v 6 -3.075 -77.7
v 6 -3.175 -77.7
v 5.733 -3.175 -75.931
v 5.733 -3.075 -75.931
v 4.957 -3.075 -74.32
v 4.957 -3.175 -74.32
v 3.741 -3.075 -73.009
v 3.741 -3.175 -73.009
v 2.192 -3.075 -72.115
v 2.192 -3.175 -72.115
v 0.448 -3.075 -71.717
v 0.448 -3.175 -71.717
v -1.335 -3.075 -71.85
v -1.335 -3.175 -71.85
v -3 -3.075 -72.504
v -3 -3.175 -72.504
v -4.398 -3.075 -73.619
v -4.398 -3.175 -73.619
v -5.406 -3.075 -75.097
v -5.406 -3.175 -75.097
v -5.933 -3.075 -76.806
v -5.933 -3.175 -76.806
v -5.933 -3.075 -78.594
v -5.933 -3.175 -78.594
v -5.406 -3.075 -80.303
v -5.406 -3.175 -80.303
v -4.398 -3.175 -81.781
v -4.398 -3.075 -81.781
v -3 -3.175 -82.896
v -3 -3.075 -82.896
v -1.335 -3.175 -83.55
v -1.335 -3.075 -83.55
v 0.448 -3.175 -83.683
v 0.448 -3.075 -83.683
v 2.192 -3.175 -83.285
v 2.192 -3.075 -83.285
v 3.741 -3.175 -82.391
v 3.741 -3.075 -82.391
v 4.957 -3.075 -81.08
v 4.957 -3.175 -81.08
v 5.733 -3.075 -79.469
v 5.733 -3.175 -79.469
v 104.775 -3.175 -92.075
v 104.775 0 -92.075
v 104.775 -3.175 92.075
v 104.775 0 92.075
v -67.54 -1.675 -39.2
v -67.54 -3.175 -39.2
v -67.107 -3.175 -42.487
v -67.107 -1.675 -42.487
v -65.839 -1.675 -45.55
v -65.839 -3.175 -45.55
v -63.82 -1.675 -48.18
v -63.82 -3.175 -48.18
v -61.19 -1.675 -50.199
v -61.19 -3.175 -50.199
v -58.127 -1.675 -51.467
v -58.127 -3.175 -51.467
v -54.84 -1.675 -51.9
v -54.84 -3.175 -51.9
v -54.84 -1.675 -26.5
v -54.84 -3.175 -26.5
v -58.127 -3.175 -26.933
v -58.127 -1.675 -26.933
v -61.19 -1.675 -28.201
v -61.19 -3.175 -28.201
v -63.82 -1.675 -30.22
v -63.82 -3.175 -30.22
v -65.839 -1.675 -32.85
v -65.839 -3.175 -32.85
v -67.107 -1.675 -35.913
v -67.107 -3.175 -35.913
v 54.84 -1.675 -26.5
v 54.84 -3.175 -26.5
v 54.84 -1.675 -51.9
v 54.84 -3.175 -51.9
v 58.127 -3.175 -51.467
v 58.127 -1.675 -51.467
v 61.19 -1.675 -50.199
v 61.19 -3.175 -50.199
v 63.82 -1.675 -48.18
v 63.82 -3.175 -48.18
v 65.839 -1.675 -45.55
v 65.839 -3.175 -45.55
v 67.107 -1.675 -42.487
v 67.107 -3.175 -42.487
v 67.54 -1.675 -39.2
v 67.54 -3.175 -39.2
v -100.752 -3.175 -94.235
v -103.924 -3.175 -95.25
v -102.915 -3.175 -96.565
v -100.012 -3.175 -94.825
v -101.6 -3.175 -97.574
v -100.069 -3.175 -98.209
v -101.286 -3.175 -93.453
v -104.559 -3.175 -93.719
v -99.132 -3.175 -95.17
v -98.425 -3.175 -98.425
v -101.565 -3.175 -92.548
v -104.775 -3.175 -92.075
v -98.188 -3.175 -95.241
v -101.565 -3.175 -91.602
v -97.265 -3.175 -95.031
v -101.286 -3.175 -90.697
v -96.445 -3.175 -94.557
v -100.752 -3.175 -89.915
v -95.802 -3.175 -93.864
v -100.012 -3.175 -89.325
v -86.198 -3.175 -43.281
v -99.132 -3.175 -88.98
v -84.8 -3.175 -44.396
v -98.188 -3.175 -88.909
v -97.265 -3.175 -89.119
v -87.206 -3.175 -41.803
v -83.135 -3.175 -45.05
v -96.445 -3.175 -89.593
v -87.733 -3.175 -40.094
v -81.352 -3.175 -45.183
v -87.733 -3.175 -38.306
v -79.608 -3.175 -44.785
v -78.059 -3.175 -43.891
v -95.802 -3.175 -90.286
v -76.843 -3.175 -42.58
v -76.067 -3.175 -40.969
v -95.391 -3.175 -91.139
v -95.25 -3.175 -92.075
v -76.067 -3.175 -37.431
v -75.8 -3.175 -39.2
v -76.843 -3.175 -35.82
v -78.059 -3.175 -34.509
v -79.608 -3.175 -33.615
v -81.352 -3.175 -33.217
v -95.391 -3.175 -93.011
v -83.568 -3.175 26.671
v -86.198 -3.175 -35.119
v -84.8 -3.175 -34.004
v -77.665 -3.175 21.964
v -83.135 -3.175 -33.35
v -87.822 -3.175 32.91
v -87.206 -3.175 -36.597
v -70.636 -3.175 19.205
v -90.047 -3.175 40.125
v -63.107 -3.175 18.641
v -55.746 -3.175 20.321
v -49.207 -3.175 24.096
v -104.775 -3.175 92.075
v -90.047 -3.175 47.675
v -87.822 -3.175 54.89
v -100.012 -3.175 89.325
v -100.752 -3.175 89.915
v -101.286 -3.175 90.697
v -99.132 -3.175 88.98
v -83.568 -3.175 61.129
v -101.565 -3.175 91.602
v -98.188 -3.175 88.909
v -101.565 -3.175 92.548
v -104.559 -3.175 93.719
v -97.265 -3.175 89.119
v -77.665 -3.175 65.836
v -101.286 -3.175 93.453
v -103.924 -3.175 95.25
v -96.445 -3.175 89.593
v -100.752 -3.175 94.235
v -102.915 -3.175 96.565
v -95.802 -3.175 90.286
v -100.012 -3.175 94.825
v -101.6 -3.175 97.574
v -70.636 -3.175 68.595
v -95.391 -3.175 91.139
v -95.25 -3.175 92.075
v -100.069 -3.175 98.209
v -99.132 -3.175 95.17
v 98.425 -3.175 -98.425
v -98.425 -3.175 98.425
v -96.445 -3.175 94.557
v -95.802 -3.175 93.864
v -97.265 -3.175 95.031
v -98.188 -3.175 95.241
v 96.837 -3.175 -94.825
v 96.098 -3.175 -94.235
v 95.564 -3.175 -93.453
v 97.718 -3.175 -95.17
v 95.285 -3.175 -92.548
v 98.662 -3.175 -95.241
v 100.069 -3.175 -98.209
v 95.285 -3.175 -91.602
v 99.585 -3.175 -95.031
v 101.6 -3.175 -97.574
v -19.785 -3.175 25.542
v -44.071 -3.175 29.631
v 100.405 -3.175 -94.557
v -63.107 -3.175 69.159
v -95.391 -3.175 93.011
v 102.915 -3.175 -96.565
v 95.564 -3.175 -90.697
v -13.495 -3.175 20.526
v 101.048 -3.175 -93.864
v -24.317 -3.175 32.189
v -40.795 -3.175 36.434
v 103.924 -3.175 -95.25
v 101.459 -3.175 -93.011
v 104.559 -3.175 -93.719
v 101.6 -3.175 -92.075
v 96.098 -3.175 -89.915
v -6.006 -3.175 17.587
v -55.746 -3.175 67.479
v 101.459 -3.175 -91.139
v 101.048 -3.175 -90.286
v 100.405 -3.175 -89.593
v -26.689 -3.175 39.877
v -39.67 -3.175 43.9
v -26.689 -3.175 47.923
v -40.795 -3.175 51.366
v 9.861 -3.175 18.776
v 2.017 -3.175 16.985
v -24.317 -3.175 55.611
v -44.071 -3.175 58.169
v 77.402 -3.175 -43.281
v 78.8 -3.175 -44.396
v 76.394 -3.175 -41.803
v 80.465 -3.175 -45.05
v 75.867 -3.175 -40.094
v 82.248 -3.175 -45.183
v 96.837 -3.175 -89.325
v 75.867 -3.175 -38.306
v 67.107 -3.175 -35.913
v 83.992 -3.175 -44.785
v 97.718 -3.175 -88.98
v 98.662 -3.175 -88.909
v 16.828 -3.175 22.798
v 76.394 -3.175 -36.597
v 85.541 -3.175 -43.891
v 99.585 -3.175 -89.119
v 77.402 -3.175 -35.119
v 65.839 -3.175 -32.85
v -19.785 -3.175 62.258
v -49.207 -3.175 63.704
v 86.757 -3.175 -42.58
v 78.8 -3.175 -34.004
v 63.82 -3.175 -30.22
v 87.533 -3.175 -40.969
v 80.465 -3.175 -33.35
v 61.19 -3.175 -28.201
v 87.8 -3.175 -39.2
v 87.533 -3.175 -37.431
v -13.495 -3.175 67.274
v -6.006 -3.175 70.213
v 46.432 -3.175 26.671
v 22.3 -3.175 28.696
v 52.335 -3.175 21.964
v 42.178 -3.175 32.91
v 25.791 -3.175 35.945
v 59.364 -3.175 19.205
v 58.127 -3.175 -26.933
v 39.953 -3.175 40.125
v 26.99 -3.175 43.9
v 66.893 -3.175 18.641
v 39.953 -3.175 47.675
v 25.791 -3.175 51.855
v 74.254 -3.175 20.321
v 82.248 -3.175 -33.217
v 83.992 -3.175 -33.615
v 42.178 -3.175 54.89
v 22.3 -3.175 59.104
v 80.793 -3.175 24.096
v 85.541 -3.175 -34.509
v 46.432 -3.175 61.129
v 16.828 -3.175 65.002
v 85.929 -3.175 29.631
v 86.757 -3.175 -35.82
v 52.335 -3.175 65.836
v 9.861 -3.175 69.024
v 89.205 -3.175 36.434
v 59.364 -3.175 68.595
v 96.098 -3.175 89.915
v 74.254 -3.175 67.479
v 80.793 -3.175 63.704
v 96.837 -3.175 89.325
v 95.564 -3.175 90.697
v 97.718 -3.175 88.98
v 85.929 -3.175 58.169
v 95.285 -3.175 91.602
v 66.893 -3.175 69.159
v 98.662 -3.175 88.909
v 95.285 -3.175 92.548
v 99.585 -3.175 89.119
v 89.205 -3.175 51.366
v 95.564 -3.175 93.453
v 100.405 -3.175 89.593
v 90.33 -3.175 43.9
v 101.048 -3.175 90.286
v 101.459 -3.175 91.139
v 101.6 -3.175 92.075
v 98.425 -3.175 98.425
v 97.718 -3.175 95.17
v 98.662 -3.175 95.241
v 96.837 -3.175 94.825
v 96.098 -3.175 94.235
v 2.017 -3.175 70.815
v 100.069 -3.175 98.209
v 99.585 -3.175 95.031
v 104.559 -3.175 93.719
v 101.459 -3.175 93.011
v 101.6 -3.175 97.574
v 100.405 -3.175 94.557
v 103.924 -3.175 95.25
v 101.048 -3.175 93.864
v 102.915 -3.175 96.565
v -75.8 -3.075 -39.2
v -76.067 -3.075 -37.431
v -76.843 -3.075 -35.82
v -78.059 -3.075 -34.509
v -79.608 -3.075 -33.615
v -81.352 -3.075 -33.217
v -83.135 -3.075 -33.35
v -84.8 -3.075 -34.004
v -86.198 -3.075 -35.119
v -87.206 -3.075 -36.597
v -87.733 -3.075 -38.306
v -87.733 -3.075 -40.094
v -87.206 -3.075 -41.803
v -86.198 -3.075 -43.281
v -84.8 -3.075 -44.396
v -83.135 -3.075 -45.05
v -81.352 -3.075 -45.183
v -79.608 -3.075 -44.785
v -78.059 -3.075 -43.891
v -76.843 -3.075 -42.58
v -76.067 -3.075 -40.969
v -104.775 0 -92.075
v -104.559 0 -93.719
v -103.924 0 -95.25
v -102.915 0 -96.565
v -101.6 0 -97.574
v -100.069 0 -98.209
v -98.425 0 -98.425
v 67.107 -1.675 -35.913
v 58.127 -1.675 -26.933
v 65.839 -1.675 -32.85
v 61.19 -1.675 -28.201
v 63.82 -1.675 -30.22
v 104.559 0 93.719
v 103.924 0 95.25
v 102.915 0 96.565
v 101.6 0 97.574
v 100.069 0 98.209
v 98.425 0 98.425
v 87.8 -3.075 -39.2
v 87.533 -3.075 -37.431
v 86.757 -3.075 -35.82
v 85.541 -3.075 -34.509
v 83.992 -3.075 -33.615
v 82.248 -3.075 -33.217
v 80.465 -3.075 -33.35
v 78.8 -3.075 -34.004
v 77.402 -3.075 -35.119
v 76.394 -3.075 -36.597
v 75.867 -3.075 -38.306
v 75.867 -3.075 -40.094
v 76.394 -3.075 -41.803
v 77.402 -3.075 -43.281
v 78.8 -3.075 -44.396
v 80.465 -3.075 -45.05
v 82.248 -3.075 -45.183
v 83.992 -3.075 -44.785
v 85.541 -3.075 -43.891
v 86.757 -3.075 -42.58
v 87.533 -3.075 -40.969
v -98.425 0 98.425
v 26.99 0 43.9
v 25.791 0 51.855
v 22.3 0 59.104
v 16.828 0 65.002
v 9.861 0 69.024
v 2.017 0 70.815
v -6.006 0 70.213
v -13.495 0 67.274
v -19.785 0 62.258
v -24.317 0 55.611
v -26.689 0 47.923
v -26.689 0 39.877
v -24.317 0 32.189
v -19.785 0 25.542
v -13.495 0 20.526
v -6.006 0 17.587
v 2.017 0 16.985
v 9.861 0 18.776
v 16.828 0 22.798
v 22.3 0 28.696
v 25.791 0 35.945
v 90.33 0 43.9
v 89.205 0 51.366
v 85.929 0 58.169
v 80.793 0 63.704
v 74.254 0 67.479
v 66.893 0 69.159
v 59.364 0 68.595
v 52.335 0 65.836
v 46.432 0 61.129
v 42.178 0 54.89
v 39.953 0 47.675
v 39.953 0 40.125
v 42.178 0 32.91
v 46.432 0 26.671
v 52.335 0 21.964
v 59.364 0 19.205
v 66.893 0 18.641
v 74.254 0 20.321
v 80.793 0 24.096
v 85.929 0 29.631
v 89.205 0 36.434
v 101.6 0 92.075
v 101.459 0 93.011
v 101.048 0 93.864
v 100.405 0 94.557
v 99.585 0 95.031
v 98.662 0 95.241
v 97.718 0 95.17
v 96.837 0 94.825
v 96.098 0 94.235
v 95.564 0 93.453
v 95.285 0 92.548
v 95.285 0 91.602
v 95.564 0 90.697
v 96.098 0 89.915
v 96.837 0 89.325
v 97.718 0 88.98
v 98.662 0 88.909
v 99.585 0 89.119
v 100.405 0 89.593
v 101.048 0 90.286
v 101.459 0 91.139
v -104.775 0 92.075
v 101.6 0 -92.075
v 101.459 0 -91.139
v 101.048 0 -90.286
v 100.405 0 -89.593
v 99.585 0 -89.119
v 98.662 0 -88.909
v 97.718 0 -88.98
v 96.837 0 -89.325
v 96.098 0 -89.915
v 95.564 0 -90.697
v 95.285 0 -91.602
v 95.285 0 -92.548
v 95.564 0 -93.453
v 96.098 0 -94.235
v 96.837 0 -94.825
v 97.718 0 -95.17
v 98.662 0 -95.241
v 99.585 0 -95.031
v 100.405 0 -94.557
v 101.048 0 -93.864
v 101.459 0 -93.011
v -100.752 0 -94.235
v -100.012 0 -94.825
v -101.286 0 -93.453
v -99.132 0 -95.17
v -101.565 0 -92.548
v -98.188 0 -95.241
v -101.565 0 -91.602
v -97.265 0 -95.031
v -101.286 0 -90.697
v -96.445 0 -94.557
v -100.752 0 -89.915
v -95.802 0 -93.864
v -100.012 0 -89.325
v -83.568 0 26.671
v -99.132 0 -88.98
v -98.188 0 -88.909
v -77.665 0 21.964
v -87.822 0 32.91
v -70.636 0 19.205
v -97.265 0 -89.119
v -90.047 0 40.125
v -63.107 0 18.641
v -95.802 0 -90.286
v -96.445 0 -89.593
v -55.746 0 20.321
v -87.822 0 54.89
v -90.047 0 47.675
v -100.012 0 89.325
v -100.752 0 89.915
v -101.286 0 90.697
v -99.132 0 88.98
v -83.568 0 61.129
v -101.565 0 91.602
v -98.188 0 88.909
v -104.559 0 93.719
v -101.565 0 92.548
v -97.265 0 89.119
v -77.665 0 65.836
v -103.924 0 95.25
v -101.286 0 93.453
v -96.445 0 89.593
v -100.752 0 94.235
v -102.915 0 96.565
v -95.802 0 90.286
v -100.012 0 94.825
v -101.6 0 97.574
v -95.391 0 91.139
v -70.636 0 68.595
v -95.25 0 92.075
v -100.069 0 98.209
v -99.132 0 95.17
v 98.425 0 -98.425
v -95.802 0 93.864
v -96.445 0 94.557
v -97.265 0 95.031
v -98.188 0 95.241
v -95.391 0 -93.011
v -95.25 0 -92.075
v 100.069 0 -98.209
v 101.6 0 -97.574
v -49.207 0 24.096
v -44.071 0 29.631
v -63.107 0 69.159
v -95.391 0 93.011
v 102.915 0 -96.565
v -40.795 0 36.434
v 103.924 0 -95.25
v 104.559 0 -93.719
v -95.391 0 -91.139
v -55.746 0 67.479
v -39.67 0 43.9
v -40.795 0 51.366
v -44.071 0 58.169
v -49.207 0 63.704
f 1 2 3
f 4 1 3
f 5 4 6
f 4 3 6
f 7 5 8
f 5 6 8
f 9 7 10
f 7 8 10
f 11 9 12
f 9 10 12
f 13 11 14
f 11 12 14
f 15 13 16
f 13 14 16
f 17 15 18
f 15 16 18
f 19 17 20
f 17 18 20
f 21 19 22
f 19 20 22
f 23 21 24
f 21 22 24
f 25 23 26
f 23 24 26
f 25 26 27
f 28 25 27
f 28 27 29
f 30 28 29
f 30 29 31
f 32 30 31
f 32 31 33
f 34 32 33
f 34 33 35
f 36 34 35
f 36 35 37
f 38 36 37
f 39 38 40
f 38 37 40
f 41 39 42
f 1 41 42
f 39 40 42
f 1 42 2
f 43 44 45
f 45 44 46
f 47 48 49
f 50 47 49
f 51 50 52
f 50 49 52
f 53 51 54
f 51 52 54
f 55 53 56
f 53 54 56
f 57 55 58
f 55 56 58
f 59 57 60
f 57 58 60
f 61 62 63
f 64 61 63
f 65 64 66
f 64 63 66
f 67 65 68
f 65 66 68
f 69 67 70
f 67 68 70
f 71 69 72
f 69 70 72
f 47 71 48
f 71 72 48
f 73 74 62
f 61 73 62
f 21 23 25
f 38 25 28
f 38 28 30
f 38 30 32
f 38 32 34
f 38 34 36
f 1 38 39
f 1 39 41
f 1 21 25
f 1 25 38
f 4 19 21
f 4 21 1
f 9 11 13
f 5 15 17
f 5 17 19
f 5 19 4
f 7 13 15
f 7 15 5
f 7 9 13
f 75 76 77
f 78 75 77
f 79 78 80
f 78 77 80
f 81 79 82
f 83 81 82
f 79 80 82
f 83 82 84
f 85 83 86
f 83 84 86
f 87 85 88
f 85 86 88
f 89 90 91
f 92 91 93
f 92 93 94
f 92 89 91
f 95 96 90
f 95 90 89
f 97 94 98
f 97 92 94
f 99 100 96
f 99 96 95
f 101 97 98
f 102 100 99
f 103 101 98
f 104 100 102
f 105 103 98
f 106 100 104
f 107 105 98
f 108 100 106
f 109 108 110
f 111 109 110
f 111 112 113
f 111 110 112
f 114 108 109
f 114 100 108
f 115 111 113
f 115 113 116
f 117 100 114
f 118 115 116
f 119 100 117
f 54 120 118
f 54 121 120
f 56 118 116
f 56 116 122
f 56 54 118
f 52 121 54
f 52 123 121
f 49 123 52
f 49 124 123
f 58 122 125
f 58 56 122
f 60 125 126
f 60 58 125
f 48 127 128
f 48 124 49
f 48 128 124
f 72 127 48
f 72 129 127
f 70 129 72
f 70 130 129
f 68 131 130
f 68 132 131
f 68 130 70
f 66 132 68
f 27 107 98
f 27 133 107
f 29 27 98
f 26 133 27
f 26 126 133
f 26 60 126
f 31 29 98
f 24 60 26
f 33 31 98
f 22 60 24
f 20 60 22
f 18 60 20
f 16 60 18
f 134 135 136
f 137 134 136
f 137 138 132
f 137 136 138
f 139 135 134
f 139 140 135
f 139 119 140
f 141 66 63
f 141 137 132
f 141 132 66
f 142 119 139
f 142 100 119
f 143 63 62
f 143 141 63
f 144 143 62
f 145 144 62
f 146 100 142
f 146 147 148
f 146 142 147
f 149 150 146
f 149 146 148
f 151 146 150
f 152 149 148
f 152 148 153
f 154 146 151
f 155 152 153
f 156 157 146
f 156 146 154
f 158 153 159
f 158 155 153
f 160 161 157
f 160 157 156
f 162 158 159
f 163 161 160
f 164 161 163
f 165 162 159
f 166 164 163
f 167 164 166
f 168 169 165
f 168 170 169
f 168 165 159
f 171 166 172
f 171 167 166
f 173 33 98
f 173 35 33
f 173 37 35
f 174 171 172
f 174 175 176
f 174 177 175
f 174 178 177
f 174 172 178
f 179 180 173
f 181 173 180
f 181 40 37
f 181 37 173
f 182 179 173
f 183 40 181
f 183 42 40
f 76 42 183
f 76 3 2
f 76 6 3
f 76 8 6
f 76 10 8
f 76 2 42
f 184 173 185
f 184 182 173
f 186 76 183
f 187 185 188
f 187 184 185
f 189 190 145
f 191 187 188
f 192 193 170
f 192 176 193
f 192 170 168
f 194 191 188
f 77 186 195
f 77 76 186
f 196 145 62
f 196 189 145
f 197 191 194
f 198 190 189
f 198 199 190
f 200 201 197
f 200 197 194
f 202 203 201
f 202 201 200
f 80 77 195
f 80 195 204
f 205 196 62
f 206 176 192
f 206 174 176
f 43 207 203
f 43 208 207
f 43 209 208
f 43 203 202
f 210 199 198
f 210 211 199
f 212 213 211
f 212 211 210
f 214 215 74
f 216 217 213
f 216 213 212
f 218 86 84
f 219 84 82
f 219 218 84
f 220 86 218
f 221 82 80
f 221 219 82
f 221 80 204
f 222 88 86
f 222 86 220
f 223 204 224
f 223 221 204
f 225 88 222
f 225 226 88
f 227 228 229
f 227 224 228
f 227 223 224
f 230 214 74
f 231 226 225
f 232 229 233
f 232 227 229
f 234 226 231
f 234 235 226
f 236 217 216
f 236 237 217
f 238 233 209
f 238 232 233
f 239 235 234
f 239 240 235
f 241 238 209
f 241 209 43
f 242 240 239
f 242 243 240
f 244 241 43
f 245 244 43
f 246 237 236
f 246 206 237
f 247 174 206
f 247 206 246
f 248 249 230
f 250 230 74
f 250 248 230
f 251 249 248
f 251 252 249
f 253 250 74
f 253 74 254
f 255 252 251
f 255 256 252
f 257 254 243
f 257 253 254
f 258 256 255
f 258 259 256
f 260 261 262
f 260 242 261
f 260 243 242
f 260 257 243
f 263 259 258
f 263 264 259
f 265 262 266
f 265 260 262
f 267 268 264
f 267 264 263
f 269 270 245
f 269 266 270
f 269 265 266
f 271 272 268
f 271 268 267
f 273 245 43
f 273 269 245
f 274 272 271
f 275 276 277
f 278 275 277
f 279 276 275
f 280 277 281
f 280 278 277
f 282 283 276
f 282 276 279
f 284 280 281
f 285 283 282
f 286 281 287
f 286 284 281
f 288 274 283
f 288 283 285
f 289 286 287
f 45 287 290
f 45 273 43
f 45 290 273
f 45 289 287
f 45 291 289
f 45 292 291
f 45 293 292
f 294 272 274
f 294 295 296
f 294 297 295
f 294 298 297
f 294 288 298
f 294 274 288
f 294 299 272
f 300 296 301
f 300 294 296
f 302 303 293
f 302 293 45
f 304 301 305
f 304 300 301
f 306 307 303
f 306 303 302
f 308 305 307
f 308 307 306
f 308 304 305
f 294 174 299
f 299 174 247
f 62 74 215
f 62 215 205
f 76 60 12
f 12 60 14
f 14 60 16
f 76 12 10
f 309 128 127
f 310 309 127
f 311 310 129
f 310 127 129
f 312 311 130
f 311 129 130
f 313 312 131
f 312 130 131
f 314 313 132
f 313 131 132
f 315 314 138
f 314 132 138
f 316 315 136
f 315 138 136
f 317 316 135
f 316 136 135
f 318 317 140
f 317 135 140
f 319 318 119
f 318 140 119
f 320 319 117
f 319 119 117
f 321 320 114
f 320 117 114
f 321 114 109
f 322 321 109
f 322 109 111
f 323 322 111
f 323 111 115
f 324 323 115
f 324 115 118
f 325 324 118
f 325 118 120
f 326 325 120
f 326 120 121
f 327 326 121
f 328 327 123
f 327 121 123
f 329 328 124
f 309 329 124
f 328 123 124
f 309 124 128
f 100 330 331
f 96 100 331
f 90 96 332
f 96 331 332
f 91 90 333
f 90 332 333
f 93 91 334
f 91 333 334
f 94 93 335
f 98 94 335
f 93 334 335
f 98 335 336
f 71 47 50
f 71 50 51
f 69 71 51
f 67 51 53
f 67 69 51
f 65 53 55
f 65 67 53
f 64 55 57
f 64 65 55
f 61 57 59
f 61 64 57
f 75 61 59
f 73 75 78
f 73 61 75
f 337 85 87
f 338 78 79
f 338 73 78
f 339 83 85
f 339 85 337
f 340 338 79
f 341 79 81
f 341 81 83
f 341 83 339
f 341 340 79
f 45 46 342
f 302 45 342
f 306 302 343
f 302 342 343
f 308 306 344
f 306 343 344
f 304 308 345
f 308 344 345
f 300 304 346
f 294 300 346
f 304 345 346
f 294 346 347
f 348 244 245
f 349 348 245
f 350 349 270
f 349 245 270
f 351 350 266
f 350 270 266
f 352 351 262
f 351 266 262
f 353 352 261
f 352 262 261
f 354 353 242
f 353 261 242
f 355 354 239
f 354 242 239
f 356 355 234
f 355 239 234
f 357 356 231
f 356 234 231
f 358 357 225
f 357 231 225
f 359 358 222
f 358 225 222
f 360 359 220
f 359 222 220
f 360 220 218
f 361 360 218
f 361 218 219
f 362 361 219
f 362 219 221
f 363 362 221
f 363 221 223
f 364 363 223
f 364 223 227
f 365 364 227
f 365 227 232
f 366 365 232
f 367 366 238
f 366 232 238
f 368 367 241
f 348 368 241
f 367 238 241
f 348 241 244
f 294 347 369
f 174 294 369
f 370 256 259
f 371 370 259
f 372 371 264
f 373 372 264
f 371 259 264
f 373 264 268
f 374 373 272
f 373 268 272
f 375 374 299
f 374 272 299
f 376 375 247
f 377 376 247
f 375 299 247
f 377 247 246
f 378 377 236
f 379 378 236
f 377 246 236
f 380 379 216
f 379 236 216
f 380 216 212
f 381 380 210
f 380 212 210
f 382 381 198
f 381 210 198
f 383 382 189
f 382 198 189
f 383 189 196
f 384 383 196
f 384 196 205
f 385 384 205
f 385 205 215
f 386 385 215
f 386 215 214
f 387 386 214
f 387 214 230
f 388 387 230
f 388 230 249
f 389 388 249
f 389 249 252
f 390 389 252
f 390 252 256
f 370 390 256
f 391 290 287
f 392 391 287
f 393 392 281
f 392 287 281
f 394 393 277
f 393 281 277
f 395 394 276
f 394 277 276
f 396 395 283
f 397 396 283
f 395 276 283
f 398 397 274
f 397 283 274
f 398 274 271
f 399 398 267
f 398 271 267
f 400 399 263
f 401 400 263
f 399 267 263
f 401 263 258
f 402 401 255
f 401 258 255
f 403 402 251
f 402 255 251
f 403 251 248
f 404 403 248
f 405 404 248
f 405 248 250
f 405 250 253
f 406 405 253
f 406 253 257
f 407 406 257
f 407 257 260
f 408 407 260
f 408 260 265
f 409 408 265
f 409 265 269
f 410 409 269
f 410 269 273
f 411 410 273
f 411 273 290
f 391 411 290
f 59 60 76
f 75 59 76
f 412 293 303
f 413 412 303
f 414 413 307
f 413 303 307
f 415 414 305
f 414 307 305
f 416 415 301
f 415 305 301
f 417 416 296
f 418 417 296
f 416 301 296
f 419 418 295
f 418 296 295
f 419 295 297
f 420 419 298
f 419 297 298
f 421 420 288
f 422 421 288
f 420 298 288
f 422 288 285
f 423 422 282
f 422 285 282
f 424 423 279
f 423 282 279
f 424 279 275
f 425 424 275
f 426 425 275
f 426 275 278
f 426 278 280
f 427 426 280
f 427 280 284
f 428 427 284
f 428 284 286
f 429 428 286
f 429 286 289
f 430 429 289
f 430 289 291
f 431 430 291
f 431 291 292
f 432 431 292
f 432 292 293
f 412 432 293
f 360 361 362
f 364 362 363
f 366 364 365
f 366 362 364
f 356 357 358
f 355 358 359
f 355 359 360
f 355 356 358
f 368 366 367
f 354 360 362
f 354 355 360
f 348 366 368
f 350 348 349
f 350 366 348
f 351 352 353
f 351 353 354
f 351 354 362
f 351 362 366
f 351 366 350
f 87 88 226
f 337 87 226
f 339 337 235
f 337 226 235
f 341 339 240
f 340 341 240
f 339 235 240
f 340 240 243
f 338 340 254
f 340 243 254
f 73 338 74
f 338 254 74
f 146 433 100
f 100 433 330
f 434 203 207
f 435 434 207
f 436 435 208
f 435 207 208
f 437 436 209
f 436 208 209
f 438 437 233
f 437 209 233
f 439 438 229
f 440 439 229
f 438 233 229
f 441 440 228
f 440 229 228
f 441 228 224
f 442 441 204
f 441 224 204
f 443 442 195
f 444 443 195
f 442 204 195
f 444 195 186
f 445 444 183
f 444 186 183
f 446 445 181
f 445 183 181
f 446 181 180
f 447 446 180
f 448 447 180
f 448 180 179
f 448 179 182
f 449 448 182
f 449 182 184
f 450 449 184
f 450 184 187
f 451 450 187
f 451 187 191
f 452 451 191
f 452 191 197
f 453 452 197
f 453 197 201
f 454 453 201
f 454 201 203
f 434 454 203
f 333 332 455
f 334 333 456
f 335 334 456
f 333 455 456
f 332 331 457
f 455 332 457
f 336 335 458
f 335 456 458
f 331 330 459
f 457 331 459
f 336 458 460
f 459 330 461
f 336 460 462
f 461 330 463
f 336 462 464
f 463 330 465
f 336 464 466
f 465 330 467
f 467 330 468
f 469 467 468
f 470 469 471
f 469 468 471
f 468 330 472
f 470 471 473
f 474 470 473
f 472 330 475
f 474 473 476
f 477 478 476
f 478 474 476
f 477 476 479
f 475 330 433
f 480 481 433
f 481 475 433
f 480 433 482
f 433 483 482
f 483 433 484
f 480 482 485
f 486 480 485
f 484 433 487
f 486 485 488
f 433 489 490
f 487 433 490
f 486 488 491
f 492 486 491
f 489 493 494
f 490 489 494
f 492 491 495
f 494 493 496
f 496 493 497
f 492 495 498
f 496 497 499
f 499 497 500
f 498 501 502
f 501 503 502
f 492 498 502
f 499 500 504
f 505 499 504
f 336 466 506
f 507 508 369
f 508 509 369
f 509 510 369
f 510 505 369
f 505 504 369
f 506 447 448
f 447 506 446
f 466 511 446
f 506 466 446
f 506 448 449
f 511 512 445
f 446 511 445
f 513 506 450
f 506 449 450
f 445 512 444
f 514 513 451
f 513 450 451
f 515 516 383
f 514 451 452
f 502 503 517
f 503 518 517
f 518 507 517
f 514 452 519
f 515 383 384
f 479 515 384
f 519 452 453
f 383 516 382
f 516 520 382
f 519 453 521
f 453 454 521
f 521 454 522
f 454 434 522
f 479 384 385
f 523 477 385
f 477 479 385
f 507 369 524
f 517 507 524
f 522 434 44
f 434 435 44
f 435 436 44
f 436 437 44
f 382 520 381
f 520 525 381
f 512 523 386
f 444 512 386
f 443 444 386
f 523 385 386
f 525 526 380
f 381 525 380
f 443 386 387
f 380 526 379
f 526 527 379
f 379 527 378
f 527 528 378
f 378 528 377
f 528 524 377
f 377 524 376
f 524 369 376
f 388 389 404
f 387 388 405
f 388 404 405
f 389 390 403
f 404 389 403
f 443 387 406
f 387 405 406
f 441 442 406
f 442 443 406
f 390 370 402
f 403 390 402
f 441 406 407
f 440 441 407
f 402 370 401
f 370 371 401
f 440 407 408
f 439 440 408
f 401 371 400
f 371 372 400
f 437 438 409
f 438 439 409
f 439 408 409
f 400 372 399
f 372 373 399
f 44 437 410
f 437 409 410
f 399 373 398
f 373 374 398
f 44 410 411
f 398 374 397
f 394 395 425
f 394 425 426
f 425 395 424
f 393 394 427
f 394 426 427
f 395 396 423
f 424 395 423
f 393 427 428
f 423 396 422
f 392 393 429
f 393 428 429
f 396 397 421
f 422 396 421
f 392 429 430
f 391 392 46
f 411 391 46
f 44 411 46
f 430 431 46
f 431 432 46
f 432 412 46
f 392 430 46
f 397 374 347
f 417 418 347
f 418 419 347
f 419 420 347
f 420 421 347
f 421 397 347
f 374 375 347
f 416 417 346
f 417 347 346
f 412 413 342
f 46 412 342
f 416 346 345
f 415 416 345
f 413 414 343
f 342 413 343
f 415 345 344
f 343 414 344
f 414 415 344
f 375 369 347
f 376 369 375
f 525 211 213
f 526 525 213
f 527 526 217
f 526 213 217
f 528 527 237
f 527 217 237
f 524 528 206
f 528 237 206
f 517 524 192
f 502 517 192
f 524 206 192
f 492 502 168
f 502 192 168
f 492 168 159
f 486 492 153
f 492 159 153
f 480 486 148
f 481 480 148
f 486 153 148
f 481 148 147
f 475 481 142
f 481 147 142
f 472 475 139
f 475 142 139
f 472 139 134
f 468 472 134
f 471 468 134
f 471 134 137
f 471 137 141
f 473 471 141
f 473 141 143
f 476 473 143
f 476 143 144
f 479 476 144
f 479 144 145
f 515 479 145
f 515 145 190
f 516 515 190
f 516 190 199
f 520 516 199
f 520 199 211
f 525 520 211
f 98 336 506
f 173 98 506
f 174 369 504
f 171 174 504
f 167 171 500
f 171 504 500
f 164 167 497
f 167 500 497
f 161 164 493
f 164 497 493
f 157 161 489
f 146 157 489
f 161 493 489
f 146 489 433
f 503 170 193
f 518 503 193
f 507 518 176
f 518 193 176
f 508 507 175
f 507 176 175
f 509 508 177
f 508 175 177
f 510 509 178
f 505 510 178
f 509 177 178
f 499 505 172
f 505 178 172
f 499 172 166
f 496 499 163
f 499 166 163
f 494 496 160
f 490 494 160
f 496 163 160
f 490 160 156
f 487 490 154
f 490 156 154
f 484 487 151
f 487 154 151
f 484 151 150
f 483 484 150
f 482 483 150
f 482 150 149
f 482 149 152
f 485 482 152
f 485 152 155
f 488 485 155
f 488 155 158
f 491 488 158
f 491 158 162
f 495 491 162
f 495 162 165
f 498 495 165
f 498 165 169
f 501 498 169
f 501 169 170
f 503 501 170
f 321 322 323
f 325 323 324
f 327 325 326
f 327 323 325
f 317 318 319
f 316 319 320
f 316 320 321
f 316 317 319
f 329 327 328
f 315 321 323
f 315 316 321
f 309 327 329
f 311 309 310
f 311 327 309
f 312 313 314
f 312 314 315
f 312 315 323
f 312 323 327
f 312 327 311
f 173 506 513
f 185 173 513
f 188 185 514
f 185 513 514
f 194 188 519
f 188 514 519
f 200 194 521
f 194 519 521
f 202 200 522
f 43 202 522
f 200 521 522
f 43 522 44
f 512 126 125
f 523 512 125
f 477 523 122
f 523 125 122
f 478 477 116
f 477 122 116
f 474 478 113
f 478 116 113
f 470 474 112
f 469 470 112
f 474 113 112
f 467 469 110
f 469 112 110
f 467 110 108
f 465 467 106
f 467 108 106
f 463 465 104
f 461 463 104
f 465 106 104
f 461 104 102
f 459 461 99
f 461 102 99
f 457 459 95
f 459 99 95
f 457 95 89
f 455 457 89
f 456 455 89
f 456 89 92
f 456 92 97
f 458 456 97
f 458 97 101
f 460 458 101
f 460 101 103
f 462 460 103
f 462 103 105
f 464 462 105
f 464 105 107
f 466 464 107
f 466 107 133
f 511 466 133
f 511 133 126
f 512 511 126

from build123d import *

# Parameters (mm, degrees)
F1_DEPTH = 3.175
F2_R     = 3.175
F3_DEPTH = 25.4
F5_DEPTH = 1.5
F6_R     = 6
F7_DEPTH = 0.1
F8_R     = 25.33
F8_R_2   = 26.99
F9_DEPTH = 3.176


with BuildPart() as f1:
    # F0 (on Front) → F1 (new body)
    with BuildSketch(Plane.XZ):
        with BuildLine():
            Line((98.425, 98.425), (-98.425, 98.425))
            ThreePointArc((-98.425, 98.425), (-102.915128, 96.565128), (-104.775, 92.075))
            Line((-104.775, 92.075), (-104.775, -92.075))
            ThreePointArc((-104.775, -92.075), (-102.915128, -96.565128), (-98.425, -98.425))
            Line((-98.425, -98.425), (98.425, -98.425))
            ThreePointArc((98.425, -98.425), (102.915128, -96.565128), (104.775, -92.075))
            Line((104.775, -92.075), (104.775, 92.075))
            ThreePointArc((104.775, 92.075), (102.915128, 96.565128), (98.425, 98.425))
        make_face()
    extrude(amount=F1_DEPTH)

    # F2 (on face) → F3 (cut)
    with BuildSketch(Plane.XZ.offset(3.175)):
        with Locations((-98.425, 92.075)):
            Circle(F2_R)
        with Locations((98.425, 92.075)):
            Circle(F2_R)
        with Locations((98.425, -92.075)):
            Circle(F2_R)
        with Locations((-98.425, -92.075)):
            Circle(F2_R)
    extrude(amount=-F3_DEPTH, mode=Mode.SUBTRACT)

    # F4 (on face) → F5 (cut)
    with BuildSketch(Plane.XZ.offset(3.175)):
        with BuildLine():
            Line((54.84, -26.5), (-54.84, -26.5))
            ThreePointArc((-54.84, -26.5), (-63.820256, -30.219744), (-67.54, -39.2))
            ThreePointArc((-67.54, -39.2), (-63.820256, -48.180256), (-54.84, -51.9))
            Line((-54.84, -51.9), (54.84, -51.9))
            ThreePointArc((54.84, -51.9), (63.820256, -48.180256), (67.54, -39.2))
            ThreePointArc((67.54, -39.2), (63.820256, -30.219744), (54.84, -26.5))
        make_face()
    extrude(amount=-F5_DEPTH, mode=Mode.SUBTRACT)

    # F6 (on face) → F7 (cut)
    with BuildSketch(Plane.XZ.offset(3.175)):
        with Locations((-81.8, -39.2)):
            Circle(F6_R)
        with Locations((0, -77.7)):
            Circle(F6_R)
        with Locations((81.8, -39.2)):
            Circle(F6_R)
    extrude(amount=-F7_DEPTH, mode=Mode.SUBTRACT)

    # F8 (on face) → F9 (cut, through all)
    with BuildSketch(Plane.XZ.offset(3.175)):
        with Locations((-65, 43.9)):
            Circle(F8_R)
        with Locations((65, 43.9)):
            Circle(F8_R)
        with Locations((0, 43.9)):
            Circle(F8_R_2)
    extrude(amount=-F9_DEPTH, mode=Mode.SUBTRACT)


solid = f1.part
